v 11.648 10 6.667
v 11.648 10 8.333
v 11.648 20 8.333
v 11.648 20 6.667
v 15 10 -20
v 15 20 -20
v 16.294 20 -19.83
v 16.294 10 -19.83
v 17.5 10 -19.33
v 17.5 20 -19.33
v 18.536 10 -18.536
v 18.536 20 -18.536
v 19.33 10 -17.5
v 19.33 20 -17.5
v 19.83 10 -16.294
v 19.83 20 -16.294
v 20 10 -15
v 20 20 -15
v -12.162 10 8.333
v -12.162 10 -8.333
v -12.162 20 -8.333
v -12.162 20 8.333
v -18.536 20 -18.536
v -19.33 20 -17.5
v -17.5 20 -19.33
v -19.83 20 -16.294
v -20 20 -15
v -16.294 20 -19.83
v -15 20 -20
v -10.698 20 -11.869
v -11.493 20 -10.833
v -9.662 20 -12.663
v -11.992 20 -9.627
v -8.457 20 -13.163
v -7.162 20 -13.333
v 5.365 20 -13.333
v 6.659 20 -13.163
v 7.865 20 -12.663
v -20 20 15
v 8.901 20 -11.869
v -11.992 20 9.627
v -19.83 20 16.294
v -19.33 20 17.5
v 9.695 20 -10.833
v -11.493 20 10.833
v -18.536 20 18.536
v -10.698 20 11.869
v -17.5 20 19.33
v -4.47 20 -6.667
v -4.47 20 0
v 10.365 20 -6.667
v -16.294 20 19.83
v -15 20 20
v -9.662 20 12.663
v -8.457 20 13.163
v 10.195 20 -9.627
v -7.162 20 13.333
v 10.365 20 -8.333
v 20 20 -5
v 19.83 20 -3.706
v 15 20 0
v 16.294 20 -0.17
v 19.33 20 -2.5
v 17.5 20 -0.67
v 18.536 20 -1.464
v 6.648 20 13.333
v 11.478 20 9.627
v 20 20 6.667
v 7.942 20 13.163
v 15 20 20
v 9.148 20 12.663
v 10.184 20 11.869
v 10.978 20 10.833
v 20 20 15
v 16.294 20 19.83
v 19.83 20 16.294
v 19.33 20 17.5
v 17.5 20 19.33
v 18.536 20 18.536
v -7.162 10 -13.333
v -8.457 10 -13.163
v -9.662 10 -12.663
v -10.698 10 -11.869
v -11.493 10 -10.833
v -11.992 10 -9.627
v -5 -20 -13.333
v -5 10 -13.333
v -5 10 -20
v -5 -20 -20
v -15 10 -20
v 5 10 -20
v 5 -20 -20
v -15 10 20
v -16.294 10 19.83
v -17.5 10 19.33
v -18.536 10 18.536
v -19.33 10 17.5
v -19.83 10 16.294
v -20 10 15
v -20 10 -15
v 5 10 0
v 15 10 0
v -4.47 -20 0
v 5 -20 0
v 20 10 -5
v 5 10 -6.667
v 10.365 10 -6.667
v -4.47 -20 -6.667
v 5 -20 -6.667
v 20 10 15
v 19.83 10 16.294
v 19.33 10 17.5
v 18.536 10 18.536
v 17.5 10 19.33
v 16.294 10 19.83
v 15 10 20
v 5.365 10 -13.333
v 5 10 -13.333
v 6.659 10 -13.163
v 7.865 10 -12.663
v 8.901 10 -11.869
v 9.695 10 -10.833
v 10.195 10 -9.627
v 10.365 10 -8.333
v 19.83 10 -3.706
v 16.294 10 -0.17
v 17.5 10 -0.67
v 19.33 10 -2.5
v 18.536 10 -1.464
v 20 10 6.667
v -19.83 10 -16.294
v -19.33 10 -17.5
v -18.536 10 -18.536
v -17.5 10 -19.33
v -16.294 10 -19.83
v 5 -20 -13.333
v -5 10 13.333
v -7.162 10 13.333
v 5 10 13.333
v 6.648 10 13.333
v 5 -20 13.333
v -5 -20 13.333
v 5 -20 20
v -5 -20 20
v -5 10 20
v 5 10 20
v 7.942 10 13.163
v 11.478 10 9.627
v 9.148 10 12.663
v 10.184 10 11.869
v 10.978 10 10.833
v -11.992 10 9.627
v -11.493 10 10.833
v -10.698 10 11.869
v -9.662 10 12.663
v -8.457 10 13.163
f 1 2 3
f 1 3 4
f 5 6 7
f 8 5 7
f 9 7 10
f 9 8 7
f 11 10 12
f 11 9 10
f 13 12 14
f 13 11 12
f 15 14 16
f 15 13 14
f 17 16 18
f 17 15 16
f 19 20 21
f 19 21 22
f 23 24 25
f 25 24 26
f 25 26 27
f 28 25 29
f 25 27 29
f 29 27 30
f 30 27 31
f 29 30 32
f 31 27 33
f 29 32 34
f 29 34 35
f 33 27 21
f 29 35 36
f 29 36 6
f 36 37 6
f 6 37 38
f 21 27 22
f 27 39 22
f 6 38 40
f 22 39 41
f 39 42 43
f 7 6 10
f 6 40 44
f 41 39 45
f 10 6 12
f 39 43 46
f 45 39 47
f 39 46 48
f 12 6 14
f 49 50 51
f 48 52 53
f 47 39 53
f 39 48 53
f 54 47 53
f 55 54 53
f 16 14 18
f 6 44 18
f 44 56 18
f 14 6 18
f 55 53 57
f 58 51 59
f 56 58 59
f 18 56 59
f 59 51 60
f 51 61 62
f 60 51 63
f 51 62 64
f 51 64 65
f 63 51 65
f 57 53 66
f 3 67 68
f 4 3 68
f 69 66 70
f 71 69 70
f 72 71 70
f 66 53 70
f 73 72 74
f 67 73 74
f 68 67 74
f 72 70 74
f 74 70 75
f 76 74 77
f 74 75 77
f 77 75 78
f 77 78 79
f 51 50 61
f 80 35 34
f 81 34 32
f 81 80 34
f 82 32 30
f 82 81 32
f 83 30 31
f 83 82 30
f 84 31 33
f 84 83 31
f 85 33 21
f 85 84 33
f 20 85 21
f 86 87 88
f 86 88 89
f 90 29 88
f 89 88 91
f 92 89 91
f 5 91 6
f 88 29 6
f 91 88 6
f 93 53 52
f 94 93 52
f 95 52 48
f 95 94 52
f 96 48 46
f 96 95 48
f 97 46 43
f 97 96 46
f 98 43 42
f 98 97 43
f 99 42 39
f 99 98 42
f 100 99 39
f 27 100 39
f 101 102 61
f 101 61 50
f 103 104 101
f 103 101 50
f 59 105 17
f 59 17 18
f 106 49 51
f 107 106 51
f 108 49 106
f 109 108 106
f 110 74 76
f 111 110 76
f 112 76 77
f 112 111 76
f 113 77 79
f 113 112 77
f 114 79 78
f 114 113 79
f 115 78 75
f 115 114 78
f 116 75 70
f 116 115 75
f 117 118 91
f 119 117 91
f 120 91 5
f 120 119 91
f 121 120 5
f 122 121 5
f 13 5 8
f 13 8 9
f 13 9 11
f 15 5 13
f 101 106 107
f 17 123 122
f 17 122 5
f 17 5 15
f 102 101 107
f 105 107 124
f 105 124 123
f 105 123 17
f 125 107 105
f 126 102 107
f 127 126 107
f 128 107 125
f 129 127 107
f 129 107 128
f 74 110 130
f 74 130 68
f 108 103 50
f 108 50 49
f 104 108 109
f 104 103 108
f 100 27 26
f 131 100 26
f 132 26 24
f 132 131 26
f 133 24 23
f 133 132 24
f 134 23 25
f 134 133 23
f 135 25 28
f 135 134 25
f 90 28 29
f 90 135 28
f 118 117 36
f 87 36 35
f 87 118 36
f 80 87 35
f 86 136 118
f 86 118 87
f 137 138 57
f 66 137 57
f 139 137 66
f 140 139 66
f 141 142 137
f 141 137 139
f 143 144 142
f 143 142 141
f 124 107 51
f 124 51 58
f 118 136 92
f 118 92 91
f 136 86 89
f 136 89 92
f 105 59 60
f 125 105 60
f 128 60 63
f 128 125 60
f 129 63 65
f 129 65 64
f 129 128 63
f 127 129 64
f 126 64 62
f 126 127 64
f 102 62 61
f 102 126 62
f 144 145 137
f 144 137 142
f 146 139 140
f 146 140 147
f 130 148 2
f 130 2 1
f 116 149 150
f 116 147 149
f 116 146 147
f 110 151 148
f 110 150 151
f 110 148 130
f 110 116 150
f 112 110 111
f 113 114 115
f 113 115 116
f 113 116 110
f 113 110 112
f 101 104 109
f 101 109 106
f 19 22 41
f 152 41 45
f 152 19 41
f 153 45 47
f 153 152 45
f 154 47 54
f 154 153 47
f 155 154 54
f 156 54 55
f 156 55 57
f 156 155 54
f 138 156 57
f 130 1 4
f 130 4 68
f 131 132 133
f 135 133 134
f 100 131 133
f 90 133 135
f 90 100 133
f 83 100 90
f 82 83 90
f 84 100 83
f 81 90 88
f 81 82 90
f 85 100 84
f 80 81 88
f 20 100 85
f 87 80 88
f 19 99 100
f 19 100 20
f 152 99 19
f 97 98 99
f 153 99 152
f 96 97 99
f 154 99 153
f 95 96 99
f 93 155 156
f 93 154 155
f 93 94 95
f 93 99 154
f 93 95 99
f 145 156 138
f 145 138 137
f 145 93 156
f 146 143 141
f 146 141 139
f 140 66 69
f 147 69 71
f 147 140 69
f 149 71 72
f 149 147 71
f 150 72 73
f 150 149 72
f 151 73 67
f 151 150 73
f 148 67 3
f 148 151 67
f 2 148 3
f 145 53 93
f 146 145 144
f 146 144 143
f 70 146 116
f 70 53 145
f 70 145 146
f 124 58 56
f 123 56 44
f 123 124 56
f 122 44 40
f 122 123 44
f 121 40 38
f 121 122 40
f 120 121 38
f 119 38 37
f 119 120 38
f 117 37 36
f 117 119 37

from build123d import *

# Parameters (mm, degrees)
F0_W     = 40
F0_H     = 40
F1_DEPTH = 20
F3_DEPTH = 20
F6_DEPTH = 20


with BuildPart() as f1:
    # F0 (on Top) → F1 (new body, symmetric)
    with BuildSketch(Plane.XY):
        Rectangle(F0_W, F0_H)
    extrude(amount=F1_DEPTH, both=True)

    # F2 (on Top) → F3 (intersect, symmetric)
    with BuildSketch(Plane.XY):
        Polygon((20, 20), (-20, 20), (-20, 10), (-5, 10), (-5, -20), (5, -20), (5, 10), (20, 10), align=None)
    extrude(amount=F3_DEPTH, both=True, mode=Mode.INTERSECT)

    # F5 (on Front) → F6 (intersect, symmetric)
    with BuildSketch(Plane.XZ):
        with BuildLine():
            Line((15, 20), (-15, 20))
            ThreePointArc((-15, 20), (-18.535534, 18.535534), (-20, 15))
            Line((-20, 15), (-20, -15))
            ThreePointArc((-20, -15), (-18.535534, -18.535534), (-15, -20))
            Line((-15, -20), (15, -20))
            ThreePointArc((15, -20), (18.535534, -18.535534), (20, -15))
            Line((20, -15), (20, -5))
            ThreePointArc((20, -5), (18.535534, -1.464466), (15, 0))
            Line((15, 0), (-4.470152, 0))
            Line((-4.470152, 0), (-4.470152, -6.666667))
            Line((-4.470152, -6.666667), (10.365012, -6.666667))
            Line((10.365012, -6.666667), (10.365012, -8.333333))
            ThreePointArc((10.365012, -8.333333), (8.900546, -11.868867), (5.365012, -13.333333))
            Line((5.365012, -13.333333), (-7.16246, -13.333333))
            ThreePointArc((-7.16246, -13.333333), (-10.697994, -11.868867), (-12.16246, -8.333333))
            Line((-12.16246, -8.333333), (-12.16246, 8.333333))
            ThreePointArc((-12.16246, 8.333333), (-10.697994, 11.868867), (-7.16246, 13.333333))
            Line((-7.16246, 13.333333), (6.648352, 13.333333))
            ThreePointArc((6.648352, 13.333333), (10.183886, 11.868867), (11.648352, 8.333333))
            Line((11.648352, 8.333333), (11.648352, 6.666667))
            Line((11.648352, 6.666667), (20, 6.666667))
            Line((20, 6.666667), (20, 15))
            ThreePointArc((20, 15), (18.535534, 18.535534), (15, 20))
        make_face()
    extrude(amount=F6_DEPTH, both=True, mode=Mode.INTERSECT)


solid = f1.part
